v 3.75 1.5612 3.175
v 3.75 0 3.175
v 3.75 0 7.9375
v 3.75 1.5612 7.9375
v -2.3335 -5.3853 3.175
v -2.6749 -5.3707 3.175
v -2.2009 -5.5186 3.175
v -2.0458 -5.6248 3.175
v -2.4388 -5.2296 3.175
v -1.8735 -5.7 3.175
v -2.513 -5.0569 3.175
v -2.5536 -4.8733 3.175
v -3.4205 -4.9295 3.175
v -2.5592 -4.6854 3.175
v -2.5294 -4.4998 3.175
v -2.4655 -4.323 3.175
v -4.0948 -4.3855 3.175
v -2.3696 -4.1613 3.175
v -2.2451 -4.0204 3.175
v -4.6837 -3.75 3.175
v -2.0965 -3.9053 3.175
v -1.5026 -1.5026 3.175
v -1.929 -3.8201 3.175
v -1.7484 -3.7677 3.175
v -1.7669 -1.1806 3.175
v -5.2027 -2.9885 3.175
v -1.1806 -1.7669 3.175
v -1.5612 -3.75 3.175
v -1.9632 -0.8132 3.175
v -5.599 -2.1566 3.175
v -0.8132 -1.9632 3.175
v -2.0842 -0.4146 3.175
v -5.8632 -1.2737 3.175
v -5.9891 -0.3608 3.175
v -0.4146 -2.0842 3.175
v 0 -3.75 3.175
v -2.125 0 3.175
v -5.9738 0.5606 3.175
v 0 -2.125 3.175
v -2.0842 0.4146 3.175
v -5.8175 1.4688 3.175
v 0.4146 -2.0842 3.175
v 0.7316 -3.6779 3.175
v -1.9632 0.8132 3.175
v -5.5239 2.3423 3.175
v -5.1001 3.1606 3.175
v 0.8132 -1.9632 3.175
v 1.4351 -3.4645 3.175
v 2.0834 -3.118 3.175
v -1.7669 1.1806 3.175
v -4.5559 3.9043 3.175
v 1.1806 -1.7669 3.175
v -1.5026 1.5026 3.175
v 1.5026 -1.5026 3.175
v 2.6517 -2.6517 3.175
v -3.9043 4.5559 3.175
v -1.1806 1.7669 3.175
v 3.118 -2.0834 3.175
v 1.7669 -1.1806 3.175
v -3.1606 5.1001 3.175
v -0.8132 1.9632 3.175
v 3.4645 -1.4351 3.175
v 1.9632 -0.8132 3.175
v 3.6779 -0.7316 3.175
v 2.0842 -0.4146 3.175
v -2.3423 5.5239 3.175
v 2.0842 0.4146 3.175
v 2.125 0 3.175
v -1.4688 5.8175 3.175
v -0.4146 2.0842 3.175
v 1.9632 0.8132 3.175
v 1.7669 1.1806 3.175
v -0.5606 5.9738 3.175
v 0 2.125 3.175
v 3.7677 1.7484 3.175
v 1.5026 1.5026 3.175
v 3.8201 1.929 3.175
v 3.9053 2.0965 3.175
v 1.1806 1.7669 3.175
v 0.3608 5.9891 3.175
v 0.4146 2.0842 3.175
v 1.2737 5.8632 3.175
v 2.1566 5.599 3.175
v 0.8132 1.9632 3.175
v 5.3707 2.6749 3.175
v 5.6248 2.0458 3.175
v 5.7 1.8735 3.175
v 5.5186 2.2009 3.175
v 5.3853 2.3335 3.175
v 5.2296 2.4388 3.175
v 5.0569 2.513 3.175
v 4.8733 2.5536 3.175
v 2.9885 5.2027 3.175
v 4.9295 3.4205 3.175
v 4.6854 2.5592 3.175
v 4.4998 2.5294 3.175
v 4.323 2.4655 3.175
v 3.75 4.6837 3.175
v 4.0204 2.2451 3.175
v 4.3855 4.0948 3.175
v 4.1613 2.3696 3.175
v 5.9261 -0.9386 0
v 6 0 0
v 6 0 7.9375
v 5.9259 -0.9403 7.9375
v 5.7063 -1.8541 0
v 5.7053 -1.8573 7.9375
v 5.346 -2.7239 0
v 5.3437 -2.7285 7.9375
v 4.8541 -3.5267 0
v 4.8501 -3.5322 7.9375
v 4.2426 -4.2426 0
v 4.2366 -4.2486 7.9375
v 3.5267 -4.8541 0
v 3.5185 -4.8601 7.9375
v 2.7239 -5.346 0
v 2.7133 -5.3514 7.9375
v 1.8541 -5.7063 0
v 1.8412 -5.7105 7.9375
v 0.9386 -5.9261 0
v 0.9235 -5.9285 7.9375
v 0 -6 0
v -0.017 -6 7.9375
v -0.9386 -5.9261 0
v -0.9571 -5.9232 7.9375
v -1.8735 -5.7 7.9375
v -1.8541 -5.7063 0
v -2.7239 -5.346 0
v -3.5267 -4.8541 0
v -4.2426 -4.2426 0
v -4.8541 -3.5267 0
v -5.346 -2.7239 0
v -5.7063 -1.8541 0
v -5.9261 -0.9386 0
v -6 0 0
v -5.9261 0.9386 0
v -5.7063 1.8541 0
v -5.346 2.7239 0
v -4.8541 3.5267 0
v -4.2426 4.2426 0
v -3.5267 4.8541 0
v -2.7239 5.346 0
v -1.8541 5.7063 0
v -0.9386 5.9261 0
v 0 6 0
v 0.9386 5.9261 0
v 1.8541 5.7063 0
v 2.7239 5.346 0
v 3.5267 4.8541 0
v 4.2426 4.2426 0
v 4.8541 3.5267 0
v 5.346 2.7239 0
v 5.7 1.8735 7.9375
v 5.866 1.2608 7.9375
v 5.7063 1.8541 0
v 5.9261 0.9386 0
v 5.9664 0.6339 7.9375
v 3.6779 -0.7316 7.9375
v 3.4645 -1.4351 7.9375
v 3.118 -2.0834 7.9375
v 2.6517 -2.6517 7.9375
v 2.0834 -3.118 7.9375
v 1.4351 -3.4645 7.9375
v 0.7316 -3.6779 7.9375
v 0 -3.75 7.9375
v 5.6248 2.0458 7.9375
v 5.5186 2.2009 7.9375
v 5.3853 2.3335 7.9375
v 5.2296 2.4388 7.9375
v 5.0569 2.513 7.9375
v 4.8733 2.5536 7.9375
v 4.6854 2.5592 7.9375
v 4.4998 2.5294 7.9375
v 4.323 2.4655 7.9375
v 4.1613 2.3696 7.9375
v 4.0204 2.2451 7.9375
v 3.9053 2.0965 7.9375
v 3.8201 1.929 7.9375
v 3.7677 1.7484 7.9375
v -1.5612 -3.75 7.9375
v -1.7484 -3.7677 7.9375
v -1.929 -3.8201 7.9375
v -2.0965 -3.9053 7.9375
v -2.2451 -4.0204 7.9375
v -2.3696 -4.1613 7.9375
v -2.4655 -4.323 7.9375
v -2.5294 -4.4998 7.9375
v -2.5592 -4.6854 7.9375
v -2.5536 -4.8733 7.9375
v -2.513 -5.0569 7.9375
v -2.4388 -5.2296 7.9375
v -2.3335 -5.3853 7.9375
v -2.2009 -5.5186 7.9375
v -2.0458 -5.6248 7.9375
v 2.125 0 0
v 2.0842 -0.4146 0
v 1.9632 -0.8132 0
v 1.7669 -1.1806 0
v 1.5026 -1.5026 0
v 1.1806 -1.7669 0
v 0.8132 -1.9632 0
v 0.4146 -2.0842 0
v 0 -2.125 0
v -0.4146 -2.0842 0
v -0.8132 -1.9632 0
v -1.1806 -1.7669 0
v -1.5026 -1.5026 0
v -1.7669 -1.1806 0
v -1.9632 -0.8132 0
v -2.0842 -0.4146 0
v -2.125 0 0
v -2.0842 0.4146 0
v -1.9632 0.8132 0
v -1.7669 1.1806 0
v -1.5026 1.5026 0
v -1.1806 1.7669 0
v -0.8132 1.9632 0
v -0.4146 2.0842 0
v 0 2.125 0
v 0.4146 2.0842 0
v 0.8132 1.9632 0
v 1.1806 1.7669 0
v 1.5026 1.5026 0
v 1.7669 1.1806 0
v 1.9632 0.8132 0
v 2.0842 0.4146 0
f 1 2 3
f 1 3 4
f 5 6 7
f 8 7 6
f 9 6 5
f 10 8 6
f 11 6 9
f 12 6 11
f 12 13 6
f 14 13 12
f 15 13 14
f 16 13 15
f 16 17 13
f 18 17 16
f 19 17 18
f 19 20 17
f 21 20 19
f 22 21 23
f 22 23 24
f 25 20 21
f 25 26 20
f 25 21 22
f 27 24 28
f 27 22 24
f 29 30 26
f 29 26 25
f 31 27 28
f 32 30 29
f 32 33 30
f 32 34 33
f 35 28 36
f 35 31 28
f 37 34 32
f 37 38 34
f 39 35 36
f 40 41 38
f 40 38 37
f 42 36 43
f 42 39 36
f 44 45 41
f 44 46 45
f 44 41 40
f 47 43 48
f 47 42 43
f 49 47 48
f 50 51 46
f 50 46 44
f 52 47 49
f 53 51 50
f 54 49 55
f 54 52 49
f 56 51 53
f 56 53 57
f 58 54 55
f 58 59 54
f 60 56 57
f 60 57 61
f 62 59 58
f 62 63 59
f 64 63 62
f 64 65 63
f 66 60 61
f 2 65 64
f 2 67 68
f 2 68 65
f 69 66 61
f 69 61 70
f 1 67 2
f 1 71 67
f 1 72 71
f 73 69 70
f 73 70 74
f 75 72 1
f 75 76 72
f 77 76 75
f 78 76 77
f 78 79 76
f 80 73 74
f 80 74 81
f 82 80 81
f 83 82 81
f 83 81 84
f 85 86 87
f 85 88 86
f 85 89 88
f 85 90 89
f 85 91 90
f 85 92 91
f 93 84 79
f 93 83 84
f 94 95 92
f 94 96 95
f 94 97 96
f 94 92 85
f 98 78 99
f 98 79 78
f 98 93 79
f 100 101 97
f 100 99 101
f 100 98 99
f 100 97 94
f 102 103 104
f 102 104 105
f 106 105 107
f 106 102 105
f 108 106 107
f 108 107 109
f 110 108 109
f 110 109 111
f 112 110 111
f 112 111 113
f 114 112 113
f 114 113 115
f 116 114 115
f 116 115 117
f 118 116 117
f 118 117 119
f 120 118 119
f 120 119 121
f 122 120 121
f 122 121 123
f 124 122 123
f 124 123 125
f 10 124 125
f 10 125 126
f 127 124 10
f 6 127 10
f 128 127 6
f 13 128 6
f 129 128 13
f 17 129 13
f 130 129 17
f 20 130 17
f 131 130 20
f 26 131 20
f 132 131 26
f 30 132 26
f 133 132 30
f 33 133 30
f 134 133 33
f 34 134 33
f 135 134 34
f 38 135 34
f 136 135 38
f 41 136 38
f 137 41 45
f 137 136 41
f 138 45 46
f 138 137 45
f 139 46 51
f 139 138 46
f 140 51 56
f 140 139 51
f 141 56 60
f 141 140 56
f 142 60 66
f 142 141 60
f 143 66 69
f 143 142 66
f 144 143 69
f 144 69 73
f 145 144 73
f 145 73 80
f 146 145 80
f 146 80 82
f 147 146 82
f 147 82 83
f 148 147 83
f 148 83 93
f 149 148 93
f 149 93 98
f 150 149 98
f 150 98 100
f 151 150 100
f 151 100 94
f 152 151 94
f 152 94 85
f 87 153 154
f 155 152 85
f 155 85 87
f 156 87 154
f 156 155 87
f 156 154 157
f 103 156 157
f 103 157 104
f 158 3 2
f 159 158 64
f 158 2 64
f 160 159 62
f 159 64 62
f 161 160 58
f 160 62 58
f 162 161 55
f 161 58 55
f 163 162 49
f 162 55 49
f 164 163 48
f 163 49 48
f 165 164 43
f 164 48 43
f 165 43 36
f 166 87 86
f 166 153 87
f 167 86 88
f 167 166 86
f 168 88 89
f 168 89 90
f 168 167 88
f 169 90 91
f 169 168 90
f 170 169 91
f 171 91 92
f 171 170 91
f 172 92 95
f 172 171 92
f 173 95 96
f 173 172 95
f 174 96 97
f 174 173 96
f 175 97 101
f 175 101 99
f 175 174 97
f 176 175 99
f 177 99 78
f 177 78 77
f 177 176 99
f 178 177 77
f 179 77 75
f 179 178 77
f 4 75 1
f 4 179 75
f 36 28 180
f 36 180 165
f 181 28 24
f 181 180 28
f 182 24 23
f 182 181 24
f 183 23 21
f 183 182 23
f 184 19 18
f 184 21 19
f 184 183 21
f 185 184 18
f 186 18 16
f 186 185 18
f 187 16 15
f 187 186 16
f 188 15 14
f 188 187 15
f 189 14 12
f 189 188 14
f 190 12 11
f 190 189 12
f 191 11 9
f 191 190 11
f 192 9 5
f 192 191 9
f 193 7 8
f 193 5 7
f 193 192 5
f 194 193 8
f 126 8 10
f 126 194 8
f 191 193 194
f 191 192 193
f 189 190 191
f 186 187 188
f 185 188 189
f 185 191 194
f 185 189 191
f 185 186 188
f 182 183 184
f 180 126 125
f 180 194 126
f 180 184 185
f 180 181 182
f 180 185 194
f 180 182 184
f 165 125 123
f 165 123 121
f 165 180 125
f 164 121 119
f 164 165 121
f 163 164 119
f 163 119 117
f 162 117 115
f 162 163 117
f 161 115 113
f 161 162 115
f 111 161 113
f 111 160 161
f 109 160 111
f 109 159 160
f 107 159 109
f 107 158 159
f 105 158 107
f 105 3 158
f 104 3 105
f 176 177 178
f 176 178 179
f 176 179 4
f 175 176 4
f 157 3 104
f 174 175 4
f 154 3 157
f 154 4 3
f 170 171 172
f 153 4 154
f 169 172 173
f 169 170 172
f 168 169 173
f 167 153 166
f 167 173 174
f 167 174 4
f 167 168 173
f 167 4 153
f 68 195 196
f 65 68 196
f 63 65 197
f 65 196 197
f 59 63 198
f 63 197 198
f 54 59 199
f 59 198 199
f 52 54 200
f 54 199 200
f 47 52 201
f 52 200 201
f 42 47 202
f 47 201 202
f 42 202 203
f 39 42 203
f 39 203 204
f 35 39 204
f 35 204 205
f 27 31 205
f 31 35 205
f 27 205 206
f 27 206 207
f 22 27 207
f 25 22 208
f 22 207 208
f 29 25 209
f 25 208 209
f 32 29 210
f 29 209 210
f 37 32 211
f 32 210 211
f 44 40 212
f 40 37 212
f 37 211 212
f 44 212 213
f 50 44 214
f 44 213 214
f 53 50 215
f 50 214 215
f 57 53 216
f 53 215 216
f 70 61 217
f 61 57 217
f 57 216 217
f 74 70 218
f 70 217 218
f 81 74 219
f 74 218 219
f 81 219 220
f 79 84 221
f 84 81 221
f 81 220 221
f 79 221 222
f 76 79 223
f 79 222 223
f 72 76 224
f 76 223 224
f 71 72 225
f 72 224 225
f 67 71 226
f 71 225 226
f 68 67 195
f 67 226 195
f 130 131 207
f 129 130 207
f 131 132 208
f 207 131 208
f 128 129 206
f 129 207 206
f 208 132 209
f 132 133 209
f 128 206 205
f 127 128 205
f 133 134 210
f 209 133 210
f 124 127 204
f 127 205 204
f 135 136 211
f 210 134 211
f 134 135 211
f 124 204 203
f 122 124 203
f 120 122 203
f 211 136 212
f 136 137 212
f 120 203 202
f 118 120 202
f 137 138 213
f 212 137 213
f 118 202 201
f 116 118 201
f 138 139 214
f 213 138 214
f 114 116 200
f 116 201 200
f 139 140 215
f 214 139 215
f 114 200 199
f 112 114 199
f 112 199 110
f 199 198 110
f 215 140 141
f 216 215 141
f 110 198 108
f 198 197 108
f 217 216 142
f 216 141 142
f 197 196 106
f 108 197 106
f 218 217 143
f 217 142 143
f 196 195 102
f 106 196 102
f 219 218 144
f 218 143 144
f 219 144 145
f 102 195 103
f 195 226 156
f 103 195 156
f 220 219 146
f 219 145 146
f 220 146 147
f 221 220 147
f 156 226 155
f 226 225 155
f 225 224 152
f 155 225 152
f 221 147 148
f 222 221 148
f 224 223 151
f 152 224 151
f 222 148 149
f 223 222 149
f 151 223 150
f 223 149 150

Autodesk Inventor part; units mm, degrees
ref_plane "YZ Plane" through (0, 0, 0) normal (1, 0, 0) x (0, 1, 0)
ref_plane "XZ Plane" through (0, 0, 0) normal (0, 1, 0) x (-1, 0, 0)
ref_plane "XY Plane" through (0, 0, 0) normal (0, 0, 1) x (1, 0, 0)
sketch "Sketch1" plane through (0, 0, 0) normal (0, 0, 1) x (1, 0, 0)
  circle A0 centre (0, 0) radius 2.125
  circle A1 centre (0, 0) radius 6
  line L0 (0, 0) -> (0, 6) construction
  line L1 (3.75, 0) -> (3.75, 6)
  line L2 (-3.75, 6) -> (-3.75, 0)
  arc A2 (-3.75, 0) -> (3.75, 0) centre (0, 0) ccw
  arc A3 (3.75, 6) -> (-3.75, 6) centre (0, 6) ccw construction
  line L3 (0, 0) -> (-6, 0) construction
  line L4 (0, 3.75) -> (-6, 3.75)
  line L5 (-6, -3.75) -> (0, -3.75)
  arc A4 (0, -3.75) -> (0, 3.75) centre (0, 0) ccw
  arc A5 (-6, 3.75) -> (-6, -3.75) centre (-6, 0) ccw construction
  circle A6 centre (0, 12.35) radius 6.35 construction
  circle A7 centre (0, 10.1) radius 6.35 construction
  arc A8 (3.75, 4.6837) -> (-4.6837, -3.75) centre (2.5103, -2.5103) ccw
  point P0 (0, 3)
  point P1 (-3, 0)
  point P2 (0, -3.75)
  point P3 (-4.6837, -3.75)
  point P4 (-3.75, 4.6837)
  point P5 (-3.75, 3.75)
  point P6 (-4.6837, 3.75)
  dimension "d0" = 4.25
  dimension "d3" = 12
  dimension "d4" = 7.5
  dimension "d5" = 7.5
  dimension "d6" = 90
  dimension "d7" = 12.7
  dimension "d8" = 12.7
extrude "Extrusion1" add sketch "Sketch1" along normal blind 3.175
extrude "Extrusion2" add sketch "Sketch1" along normal blind 7.9375 contours A1 L5 A2 L1
fillet "Fillet1" radius 1 2 edges at (3.75, 4.6837, 5.5563) (-4.6837, -3.75, 5.5563)
equation "\"d4\" = d5"
properties part number "Cam - Shell" material "Nylon 6/6"
